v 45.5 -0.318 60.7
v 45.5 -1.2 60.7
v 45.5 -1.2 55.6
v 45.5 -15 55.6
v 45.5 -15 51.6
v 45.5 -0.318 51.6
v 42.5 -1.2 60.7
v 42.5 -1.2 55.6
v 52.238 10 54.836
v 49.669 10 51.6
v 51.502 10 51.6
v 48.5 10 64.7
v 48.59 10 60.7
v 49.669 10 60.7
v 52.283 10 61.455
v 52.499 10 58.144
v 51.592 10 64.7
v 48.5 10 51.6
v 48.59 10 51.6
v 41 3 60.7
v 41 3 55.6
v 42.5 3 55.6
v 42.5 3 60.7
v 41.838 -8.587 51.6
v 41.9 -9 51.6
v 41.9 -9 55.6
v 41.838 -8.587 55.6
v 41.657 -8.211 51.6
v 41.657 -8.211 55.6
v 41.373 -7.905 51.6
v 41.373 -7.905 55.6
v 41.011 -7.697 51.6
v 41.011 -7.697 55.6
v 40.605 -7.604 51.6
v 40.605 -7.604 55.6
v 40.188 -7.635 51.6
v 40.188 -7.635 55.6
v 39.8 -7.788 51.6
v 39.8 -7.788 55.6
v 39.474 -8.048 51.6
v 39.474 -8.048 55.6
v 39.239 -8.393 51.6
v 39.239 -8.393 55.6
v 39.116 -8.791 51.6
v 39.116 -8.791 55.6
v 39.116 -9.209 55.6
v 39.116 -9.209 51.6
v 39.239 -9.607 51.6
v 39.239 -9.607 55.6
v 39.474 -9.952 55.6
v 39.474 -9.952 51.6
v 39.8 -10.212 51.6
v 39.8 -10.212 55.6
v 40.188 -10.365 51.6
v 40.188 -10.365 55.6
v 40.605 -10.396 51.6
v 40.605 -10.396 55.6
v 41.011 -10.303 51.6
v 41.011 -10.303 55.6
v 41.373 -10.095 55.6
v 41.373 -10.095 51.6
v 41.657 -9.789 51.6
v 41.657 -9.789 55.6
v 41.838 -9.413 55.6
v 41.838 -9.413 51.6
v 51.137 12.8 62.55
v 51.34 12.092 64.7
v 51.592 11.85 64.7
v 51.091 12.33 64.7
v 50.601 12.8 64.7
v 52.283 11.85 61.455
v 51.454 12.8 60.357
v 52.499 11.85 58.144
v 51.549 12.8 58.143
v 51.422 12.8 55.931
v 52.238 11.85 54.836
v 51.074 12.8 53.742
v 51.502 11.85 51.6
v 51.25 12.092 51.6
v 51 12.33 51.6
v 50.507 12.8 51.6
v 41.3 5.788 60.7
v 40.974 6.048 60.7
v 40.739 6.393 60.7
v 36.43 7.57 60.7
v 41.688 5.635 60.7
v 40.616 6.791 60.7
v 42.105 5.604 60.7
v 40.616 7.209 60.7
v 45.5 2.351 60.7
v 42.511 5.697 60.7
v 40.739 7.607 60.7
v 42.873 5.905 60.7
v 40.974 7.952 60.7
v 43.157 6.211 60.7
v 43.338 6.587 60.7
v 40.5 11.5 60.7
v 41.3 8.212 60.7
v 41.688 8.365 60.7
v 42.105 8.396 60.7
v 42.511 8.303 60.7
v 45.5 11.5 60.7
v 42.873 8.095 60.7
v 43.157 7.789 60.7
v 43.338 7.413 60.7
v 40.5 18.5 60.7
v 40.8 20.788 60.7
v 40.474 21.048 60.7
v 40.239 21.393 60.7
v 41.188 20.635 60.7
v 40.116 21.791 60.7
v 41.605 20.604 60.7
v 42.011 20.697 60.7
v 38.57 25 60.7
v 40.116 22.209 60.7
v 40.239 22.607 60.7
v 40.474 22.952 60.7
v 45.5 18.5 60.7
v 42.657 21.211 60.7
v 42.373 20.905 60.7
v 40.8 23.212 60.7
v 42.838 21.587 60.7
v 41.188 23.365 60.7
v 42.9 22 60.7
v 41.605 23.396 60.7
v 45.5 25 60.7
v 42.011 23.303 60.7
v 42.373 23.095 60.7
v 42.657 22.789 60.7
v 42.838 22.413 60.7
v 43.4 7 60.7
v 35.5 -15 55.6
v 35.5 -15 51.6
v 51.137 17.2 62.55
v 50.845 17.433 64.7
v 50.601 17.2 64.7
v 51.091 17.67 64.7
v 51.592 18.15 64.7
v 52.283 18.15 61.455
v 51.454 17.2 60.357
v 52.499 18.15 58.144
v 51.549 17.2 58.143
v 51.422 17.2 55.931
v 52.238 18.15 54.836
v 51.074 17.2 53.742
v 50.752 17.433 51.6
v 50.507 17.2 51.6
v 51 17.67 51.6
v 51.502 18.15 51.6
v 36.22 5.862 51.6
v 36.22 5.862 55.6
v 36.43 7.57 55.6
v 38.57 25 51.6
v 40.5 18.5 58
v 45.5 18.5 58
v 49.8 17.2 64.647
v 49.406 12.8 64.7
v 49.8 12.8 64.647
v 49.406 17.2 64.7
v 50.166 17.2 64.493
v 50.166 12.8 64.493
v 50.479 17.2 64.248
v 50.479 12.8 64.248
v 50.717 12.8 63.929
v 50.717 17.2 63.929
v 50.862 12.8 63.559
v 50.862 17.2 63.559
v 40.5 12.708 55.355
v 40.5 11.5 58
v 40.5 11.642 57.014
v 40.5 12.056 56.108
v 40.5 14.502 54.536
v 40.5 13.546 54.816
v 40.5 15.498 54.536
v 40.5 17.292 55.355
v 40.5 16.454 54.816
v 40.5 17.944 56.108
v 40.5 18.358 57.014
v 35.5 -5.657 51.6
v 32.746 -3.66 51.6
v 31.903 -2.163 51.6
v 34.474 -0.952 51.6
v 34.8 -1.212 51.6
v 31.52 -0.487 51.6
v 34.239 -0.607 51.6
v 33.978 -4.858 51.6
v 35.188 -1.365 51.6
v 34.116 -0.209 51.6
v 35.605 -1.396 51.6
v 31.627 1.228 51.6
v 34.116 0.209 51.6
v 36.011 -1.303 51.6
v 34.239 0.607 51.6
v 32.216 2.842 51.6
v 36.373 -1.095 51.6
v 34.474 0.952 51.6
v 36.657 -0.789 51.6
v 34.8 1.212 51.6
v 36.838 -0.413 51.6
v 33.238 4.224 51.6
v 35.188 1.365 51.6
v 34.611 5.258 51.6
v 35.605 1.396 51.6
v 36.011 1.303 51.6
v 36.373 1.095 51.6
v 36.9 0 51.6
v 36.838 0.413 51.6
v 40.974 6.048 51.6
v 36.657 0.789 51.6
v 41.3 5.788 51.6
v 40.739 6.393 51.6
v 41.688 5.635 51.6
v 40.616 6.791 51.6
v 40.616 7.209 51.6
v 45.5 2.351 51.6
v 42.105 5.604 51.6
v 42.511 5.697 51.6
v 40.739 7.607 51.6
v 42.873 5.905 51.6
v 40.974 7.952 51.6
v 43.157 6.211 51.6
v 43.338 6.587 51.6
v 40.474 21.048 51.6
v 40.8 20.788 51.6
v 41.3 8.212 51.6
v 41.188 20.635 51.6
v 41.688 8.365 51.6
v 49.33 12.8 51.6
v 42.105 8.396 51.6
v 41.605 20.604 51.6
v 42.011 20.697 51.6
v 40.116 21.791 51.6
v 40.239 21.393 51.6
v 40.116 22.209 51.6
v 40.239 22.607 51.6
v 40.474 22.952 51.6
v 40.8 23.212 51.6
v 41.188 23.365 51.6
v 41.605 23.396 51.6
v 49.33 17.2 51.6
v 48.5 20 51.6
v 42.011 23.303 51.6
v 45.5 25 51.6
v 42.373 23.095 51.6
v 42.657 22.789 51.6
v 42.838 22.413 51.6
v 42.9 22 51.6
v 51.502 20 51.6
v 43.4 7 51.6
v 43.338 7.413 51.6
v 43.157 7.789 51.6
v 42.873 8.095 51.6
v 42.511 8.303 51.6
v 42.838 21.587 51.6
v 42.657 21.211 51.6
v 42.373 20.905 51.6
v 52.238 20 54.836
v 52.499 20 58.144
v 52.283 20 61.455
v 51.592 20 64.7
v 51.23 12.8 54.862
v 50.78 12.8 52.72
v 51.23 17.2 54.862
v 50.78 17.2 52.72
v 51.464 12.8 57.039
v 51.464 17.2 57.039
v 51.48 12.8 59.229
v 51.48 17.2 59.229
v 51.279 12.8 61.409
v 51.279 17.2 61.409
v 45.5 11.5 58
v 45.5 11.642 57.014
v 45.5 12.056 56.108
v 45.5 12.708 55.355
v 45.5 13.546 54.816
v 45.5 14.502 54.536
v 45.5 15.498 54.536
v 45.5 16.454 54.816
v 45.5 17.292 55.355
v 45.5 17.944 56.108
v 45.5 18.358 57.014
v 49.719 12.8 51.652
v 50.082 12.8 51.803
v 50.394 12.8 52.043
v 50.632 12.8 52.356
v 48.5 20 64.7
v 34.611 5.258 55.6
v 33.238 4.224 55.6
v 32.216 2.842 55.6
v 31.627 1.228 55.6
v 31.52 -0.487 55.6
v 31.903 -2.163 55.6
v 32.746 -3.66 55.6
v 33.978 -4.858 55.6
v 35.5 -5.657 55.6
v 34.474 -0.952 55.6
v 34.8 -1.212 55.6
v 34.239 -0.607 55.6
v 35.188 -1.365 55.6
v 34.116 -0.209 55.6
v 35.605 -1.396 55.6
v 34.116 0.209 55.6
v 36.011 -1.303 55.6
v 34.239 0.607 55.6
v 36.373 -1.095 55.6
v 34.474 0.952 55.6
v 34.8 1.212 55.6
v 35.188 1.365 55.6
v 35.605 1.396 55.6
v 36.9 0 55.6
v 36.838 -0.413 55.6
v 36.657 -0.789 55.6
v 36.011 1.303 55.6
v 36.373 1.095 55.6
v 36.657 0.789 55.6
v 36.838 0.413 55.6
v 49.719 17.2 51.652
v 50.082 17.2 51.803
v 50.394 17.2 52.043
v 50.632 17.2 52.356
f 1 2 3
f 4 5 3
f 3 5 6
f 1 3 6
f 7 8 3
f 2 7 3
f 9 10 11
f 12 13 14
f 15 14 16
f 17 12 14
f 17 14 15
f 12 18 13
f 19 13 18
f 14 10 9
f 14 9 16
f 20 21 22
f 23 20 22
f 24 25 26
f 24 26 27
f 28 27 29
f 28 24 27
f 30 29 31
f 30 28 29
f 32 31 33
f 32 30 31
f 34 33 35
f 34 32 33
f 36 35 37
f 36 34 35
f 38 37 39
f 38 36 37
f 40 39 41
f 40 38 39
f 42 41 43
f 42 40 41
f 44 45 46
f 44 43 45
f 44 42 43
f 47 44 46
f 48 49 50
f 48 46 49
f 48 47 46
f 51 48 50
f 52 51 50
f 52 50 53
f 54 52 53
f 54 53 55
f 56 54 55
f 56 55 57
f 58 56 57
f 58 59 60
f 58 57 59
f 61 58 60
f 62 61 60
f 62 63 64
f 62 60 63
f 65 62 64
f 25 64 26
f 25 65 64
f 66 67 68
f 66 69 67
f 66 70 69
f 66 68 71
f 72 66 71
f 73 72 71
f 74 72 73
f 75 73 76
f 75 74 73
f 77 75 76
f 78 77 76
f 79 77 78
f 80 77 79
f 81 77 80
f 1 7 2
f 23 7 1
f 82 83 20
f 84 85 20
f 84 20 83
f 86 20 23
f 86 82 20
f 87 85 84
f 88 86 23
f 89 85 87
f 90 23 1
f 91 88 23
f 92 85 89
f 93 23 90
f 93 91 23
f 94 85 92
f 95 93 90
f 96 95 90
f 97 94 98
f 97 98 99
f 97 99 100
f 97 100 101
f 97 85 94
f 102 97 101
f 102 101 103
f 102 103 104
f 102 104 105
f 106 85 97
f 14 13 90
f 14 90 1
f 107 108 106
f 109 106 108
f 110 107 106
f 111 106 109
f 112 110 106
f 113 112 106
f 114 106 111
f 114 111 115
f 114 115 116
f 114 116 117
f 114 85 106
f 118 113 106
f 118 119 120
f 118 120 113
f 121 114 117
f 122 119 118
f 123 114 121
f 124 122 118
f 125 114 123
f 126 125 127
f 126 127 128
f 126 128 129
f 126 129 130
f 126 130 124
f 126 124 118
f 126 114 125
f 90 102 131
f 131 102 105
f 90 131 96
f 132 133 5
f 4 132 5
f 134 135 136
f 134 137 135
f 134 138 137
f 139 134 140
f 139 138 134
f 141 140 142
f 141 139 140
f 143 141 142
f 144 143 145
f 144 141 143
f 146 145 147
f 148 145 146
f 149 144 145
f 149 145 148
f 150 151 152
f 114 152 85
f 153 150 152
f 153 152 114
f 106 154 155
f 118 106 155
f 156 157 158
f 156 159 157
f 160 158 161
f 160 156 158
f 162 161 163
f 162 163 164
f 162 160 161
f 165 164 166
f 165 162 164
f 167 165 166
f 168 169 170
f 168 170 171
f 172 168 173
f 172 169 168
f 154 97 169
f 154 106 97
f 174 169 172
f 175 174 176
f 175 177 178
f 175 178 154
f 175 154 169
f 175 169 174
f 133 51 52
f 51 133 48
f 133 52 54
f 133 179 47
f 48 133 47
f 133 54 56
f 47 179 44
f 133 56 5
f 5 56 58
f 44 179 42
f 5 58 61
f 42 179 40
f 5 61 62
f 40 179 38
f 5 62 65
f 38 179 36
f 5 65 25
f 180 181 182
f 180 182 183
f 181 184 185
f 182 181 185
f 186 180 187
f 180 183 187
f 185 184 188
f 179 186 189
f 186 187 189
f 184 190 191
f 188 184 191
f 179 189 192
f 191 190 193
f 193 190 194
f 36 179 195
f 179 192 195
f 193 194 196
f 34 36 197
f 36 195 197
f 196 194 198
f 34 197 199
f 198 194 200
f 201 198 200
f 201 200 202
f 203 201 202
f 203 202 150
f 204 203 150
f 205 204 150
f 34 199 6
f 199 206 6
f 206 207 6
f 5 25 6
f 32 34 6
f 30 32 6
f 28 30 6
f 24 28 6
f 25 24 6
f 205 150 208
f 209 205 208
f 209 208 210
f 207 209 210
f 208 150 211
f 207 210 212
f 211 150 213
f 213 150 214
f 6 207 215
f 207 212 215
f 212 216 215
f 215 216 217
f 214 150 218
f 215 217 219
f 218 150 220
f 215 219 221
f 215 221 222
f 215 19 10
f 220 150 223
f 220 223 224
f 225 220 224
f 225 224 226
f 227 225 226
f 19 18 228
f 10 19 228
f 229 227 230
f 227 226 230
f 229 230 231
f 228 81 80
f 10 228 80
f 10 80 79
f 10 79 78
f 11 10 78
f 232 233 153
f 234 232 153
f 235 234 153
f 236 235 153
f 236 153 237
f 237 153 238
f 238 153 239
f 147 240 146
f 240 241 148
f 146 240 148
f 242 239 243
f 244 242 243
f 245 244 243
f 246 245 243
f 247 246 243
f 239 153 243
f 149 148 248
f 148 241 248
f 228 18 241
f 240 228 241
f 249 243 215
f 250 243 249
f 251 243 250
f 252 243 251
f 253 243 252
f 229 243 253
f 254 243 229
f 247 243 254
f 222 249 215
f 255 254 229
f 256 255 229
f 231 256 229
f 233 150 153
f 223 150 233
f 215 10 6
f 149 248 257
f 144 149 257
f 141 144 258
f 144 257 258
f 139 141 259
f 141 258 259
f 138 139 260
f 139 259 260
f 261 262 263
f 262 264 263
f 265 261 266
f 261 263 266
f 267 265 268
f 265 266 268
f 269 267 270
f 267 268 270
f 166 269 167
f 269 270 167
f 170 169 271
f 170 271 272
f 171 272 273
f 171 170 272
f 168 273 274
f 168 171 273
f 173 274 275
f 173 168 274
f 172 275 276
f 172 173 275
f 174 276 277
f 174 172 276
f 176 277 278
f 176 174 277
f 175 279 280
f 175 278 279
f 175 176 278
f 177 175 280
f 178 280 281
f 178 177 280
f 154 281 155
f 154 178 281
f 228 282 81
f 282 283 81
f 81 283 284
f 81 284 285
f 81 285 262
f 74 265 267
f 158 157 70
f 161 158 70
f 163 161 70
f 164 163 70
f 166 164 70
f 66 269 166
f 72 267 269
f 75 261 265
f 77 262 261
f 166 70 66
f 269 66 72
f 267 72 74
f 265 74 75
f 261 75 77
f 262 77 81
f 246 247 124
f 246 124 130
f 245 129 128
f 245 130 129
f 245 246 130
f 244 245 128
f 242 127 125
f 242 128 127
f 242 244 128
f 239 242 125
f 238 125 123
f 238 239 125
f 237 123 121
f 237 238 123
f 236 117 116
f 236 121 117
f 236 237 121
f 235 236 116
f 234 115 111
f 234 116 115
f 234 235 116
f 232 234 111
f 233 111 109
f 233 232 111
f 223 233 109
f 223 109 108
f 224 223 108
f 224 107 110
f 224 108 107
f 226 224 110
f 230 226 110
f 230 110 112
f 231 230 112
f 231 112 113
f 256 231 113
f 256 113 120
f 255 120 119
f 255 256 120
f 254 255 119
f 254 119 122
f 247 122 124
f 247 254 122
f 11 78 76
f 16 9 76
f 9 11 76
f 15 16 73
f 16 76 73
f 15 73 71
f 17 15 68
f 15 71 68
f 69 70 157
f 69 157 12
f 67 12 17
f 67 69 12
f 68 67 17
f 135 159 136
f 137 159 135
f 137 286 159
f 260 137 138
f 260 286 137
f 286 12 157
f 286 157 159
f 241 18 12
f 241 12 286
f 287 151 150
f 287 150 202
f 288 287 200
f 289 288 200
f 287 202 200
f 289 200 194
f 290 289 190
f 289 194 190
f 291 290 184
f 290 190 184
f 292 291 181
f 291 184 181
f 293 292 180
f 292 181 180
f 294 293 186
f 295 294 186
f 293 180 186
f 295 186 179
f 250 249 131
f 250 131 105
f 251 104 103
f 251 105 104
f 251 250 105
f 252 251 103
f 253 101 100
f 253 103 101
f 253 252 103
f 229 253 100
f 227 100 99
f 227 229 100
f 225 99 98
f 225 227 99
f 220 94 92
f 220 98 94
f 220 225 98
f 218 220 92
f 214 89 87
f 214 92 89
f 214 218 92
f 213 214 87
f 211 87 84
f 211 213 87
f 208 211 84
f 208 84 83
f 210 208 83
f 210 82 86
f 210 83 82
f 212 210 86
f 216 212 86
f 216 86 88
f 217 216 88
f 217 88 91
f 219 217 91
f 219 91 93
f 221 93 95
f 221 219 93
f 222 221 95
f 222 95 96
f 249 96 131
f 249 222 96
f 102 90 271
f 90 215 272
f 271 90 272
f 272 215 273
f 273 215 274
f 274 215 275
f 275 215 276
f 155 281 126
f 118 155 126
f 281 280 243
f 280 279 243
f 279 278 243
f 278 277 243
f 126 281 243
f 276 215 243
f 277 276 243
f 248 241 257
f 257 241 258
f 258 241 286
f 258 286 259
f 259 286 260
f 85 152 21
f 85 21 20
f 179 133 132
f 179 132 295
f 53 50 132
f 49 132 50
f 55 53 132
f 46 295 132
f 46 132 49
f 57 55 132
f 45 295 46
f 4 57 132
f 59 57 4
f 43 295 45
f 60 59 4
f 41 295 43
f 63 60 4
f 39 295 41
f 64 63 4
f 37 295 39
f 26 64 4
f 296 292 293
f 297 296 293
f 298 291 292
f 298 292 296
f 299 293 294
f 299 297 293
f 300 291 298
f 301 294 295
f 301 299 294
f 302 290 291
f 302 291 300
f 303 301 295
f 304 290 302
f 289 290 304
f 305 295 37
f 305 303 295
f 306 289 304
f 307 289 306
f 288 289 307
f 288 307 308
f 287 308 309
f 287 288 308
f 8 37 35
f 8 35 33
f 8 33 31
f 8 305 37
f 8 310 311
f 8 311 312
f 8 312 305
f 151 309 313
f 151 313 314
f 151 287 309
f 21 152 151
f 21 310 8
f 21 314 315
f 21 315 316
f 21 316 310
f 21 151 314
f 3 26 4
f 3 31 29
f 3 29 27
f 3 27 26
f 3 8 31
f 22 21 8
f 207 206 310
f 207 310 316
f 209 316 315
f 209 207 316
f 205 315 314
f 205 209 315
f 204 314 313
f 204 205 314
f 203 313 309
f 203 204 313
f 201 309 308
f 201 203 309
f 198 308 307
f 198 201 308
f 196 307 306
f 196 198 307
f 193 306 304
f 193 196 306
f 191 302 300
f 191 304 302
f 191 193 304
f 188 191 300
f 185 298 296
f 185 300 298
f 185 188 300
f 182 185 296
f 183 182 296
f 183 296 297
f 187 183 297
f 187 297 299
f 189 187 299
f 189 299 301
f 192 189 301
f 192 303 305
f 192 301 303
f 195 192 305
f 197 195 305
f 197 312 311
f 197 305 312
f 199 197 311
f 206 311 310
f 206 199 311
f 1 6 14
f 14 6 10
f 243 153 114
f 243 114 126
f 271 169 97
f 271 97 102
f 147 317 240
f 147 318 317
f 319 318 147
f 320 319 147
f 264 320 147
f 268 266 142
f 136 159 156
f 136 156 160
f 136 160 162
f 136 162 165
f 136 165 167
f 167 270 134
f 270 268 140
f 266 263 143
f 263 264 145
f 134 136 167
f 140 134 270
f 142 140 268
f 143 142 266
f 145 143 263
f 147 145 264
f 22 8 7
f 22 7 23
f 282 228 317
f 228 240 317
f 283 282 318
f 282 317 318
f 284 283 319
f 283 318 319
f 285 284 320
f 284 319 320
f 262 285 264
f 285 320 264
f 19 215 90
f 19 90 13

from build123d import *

# Parameters (mm, degrees)
CYLINDER084_R           = 1.4
CYLINDER084_DEPTH       = 50
CYLINDER086_R           = 1.4
CYLINDER086_DEPTH       = 50
CYLINDER085_R           = 1.4
CYLINDER085_DEPTH       = 50
CYLINDER083_R           = 1.4
CYLINDER083_DEPTH       = 50
BOX024_W                = 1
BOX024_H                = 13.5
BOX024_DEPTH            = 9.1
BOX024_PLACEMENT_ANGLE  = -22
BOX025_W                = 110
BOX025_H                = 15
BOX025_DEPTH            = 53
BOX026_W                = 110
BOX026_H                = 15
BOX026_DEPTH            = 53
BOX020_W                = 110
BOX020_H                = 15
BOX020_DEPTH            = 53
CYLINDER043_R           = 23
CYLINDER043_DEPTH       = 2.8
CYLINDER043_ROLL_ANGLE  = 90
CYLINDER039_R           = 22
CYLINDER039_DEPTH       = 10
CYLINDER039_ROLL_ANGLE  = 90
CYLINDER042_R           = 23
CYLINDER042_DEPTH       = 2.8
CYLINDER042_ROLL_ANGLE  = 90
CHAMFER004_SIZE         = 0.95
FILLET_R                = 1.5
BOX023_W                = 3
BOX023_H                = 6
BOX023_DEPTH            = 6
CYLINDER040_R           = 3.5
CYLINDER040_DEPTH       = 8
CYLINDER040_PITCH_ANGLE = 90
BOX022_W                = 8
BOX022_H                = 7
BOX022_DEPTH            = 10
BOX018_W                = 66
BOX018_H                = 50
BOX018_DEPTH            = 25
BOX018_PLACEMENT_ANGLE  = -7
BOX008_W                = 10
BOX008_H                = 22
BOX008_DEPTH            = 6
CHAMFER001_SIZE         = 5.5
BOX009_W                = 10
BOX009_H                = 40
BOX009_DEPTH            = 4
CYLINDER025_R           = 6
CYLINDER025_DEPTH       = 4


with BuildPart() as m3_studding021:
    # Cylinder084 → Cylinder084 (new body)
    with BuildSketch(Plane(origin=(41, -9, 27), x_dir=(1, 0, 0), z_dir=(0, 0, 1))):
        Circle(CYLINDER084_R)
    extrude(amount=CYLINDER084_DEPTH)


with BuildPart() as m3_studding023:
    # Cylinder086 → Cylinder086 (new body)
    with BuildSketch(Plane(origin=(42.5, 7, 27), x_dir=(1, 0, 0), z_dir=(0, 0, 1))):
        Circle(CYLINDER086_R)
    extrude(amount=CYLINDER086_DEPTH)


with BuildPart() as m3_studding022:
    # Cylinder085 → Cylinder085 (new body)
    with BuildSketch(Plane(origin=(42, 22, 27), x_dir=(1, 0, 0), z_dir=(0, 0, 1))):
        Circle(CYLINDER085_R)
    extrude(amount=CYLINDER085_DEPTH)


with BuildPart() as m3_tap003:
    # Cylinder083 → Cylinder083 (new body)
    with BuildSketch(Plane(origin=(36, 0, 27), x_dir=(1, 0, 0), z_dir=(0, 0, 1))):
        Circle(CYLINDER083_R)
    extrude(amount=CYLINDER083_DEPTH)

    # Fusion049: union m3-studding021, m3-studding023, m3-studding022
    add(m3_studding021.part)
    add(m3_studding023.part)
    add(m3_studding022.part)


with BuildPart() as cube024:
    # Box024 → Box024 (new body)
    with BuildSketch(Plane.XY):
        with Locations((0.5, 6.75)):
            Rectangle(BOX024_W, BOX024_H)
    extrude(amount=BOX024_DEPTH)


with BuildPart() as cube024_1:
    # Box024 placement: moved
    add(cube024.part.moved(Location((44.78403, -0.65857, 51.6))).rotate(Axis((44.78403, -0.65857, 51.6), (0, 0, 1)), BOX024_PLACEMENT_ANGLE))


with BuildPart() as cube025:
    # Box025 → Box025 (new body)
    with BuildSketch(Plane(origin=(-45, 8, 64.7), x_dir=(1, 0, 0), z_dir=(0, 0, 1))):
        with Locations((55, 7.5)):
            Rectangle(BOX025_W, BOX025_H)
    extrude(amount=BOX025_DEPTH)


with BuildPart() as cube026:
    # Box026 → Box026 (new body)
    with BuildSketch(Plane(origin=(-42, 8, -1.4), x_dir=(1, 0, 0), z_dir=(0, 0, 1))):
        with Locations((55, 7.5)):
            Rectangle(BOX026_W, BOX026_H)
    extrude(amount=BOX026_DEPTH)


with BuildPart() as bump_chop001:
    # Box020 → Box020 (new body)
    with BuildSketch(Plane(origin=(-61, 8, 30.5), x_dir=(1, 0, 0), z_dir=(0, 0, 1))):
        with Locations((55, 7.5)):
            Rectangle(BOX020_W, BOX020_H)
    extrude(amount=BOX020_DEPTH)

    # Fusion023: union Cube025, Cube026
    add(cube025.part)
    add(cube026.part)


with BuildPart() as filament007:
    # Cylinder043 → Cylinder043 (new body)
    with BuildSketch(Plane.XY):
        Circle(CYLINDER043_R)
    extrude(amount=CYLINDER043_DEPTH)


with BuildPart() as filament007_1:
    # Cylinder043 roll: moved
    add(filament007.part.rotate(Axis((0, 0, 0), (1, 0, 0)), CYLINDER043_ROLL_ANGLE))


with BuildPart() as filament007_2:
    # Cylinder043 placement: moved
    add(filament007_1.part.moved(Location((30, 13.8, 58.3))))


with BuildPart() as filament005:
    # Cylinder039 → Cylinder039 (new body)
    with BuildSketch(Plane.XY):
        Circle(CYLINDER039_R)
    extrude(amount=CYLINDER039_DEPTH)


with BuildPart() as filament005_1:
    # Cylinder039 roll: moved
    add(filament005.part.rotate(Axis((0, 0, 0), (1, 0, 0)), CYLINDER039_ROLL_ANGLE))


with BuildPart() as filament005_2:
    # Cylinder039 placement: moved
    add(filament005_1.part.moved(Location((30, 21, 58.3))))


with BuildPart() as fillet_body:
    # Cylinder042 → Cylinder042 (new body)
    with BuildSketch(Plane.XY):
        Circle(CYLINDER042_R)
    extrude(amount=CYLINDER042_DEPTH)


with BuildPart() as fillet_body_1:
    # Cylinder042 roll: moved
    add(fillet_body.part.rotate(Axis((0, 0, 0), (1, 0, 0)), CYLINDER042_ROLL_ANGLE))


with BuildPart() as fillet_body_2:
    # Cylinder042 placement: moved
    add(fillet_body_1.part.moved(Location((30, 21, 58.3))))

    # Fusion024: union filament007, filament005
    add(filament007_2.part)
    add(filament005_2.part)

    # Cut015: cut bump-chop001
    add(bump_chop001.part, mode=Mode.SUBTRACT)

    # Chamfer004
    chamfer004_edges = [fillet_body_2.edges().sort_by_distance(p)[0] for p in [
        (52.749258, 18.2, 54.913076),
        (52.771775, 18.2, 61.532071),
        (52.749258, 13.8, 54.913076),
        (52.771775, 13.8, 61.532071),
    ]]
    chamfer(chamfer004_edges, length=CHAMFER004_SIZE)


with BuildPart() as fillet_body_3:
    # Chamfer004 placement: moved
    add(fillet_body_2.part.moved(Location((0, -1, 0))))

    # Fillet
    fillet_edges = [fillet_body_3.edges().sort_by_distance(p)[0] for p in [
        (50.954952, 15, 51.6),
        (51.048515, 15, 64.7),
    ]]
    fillet(fillet_edges, radius=FILLET_R)


with BuildPart() as cube023:
    # Box023 → Box023 (new body)
    with BuildSketch(Plane(origin=(43, -1.2, 54.7), x_dir=(1, 0, 0), z_dir=(0, 0, 1))):
        with Locations((1.5, 3)):
            Rectangle(BOX023_W, BOX023_H)
    extrude(amount=BOX023_DEPTH)


with BuildPart() as cylinder040:
    # Cylinder040 → Cylinder040 (new body)
    with BuildSketch(Plane.XY):
        Circle(CYLINDER040_R)
    extrude(amount=CYLINDER040_DEPTH)


with BuildPart() as cylinder040_1:
    # Cylinder040 pitch: moved
    add(cylinder040.part.rotate(Axis((0, 0, 0), (0, 1, 0)), CYLINDER040_PITCH_ANGLE))


with BuildPart() as cylinder040_2:
    # Cylinder040 placement: moved
    add(cylinder040_1.part.moved(Location((41, 16, 58))))


with BuildPart() as spring_cavity:
    # Box022 → Box022 (new body)
    with BuildSketch(Plane(origin=(41, 12.5, 58), x_dir=(1, 0, 0), z_dir=(0, 0, 1))):
        with Locations((4, 3.5)):
            Rectangle(BOX022_W, BOX022_H)
    extrude(amount=BOX022_DEPTH)

    # Fusion020: union Cylinder040
    add(cylinder040_2.part)


with BuildPart() as spring_cavity_1:
    # Fusion020 placement: moved
    add(spring_cavity.part.moved(Location((0, -1, 0))))


with BuildPart() as cube018:
    # Box018 → Box018 (new body)
    with BuildSketch(Plane.XY):
        with Locations((33, 25)):
            Rectangle(BOX018_W, BOX018_H)
    extrude(amount=BOX018_DEPTH)


with BuildPart() as cube018_1:
    # Box018 placement: moved
    add(cube018.part.moved(Location((-31.823564, -10.815, 45))).rotate(Axis((-31.823564, -10.815, 45), (0, 0, 1)), BOX018_PLACEMENT_ANGLE))


with BuildPart() as chamfer001:
    # Box008 → Box008 (new body)
    with BuildSketch(Plane(origin=(36, 3, 54.7), x_dir=(1, 0, 0), z_dir=(0, 0, 1))):
        with Locations((5, 11)):
            Rectangle(BOX008_W, BOX008_H)
    extrude(amount=BOX008_DEPTH)

    # Chamfer001
    chamfer001_edges = [chamfer001.edges().sort_by_distance(p)[0] for p in [
        (36, 3, 57.7),
    ]]
    chamfer(chamfer001_edges, length=CHAMFER001_SIZE)


with BuildPart() as cut007:
    # Box009 → Box009 (new body)
    with BuildSketch(Plane(origin=(36, -15, 51.6), x_dir=(1, 0, 0), z_dir=(0, 0, 1))):
        with Locations((5, 20)):
            Rectangle(BOX009_W, BOX009_H)
    extrude(amount=BOX009_DEPTH)

    # Fusion012: union Chamfer001
    add(chamfer001.part)

    # Cut007: cut Cube018
    add(cube018_1.part, mode=Mode.SUBTRACT)


with BuildPart() as wedge_clamp:
    # Cylinder025 → Cylinder025 (new body)
    with BuildSketch(Plane(origin=(38, 0, 51.6), x_dir=(1, 0, 0), z_dir=(0, 0, 1))):
        Circle(CYLINDER025_R)
    extrude(amount=CYLINDER025_DEPTH)

    # Fusion014: union Cut007
    add(cut007.part)

    # Cut013: cut spring-cavity
    add(spring_cavity_1.part, mode=Mode.SUBTRACT)

    # Fusion021: union Cube023
    add(cube023.part)

    # Fusion025: union Cube024, Fillet body
    add(cube024_1.part)
    add(fillet_body_3.part)

    # Cut036: cut M3-tap003
    add(m3_tap003.part, mode=Mode.SUBTRACT)


with BuildPart() as wedge_clamp_1:
    # Cut036 placement: moved
    add(wedge_clamp.part.moved(Location((-0.5, 0, 0))))


solid = wedge_clamp_1.part
